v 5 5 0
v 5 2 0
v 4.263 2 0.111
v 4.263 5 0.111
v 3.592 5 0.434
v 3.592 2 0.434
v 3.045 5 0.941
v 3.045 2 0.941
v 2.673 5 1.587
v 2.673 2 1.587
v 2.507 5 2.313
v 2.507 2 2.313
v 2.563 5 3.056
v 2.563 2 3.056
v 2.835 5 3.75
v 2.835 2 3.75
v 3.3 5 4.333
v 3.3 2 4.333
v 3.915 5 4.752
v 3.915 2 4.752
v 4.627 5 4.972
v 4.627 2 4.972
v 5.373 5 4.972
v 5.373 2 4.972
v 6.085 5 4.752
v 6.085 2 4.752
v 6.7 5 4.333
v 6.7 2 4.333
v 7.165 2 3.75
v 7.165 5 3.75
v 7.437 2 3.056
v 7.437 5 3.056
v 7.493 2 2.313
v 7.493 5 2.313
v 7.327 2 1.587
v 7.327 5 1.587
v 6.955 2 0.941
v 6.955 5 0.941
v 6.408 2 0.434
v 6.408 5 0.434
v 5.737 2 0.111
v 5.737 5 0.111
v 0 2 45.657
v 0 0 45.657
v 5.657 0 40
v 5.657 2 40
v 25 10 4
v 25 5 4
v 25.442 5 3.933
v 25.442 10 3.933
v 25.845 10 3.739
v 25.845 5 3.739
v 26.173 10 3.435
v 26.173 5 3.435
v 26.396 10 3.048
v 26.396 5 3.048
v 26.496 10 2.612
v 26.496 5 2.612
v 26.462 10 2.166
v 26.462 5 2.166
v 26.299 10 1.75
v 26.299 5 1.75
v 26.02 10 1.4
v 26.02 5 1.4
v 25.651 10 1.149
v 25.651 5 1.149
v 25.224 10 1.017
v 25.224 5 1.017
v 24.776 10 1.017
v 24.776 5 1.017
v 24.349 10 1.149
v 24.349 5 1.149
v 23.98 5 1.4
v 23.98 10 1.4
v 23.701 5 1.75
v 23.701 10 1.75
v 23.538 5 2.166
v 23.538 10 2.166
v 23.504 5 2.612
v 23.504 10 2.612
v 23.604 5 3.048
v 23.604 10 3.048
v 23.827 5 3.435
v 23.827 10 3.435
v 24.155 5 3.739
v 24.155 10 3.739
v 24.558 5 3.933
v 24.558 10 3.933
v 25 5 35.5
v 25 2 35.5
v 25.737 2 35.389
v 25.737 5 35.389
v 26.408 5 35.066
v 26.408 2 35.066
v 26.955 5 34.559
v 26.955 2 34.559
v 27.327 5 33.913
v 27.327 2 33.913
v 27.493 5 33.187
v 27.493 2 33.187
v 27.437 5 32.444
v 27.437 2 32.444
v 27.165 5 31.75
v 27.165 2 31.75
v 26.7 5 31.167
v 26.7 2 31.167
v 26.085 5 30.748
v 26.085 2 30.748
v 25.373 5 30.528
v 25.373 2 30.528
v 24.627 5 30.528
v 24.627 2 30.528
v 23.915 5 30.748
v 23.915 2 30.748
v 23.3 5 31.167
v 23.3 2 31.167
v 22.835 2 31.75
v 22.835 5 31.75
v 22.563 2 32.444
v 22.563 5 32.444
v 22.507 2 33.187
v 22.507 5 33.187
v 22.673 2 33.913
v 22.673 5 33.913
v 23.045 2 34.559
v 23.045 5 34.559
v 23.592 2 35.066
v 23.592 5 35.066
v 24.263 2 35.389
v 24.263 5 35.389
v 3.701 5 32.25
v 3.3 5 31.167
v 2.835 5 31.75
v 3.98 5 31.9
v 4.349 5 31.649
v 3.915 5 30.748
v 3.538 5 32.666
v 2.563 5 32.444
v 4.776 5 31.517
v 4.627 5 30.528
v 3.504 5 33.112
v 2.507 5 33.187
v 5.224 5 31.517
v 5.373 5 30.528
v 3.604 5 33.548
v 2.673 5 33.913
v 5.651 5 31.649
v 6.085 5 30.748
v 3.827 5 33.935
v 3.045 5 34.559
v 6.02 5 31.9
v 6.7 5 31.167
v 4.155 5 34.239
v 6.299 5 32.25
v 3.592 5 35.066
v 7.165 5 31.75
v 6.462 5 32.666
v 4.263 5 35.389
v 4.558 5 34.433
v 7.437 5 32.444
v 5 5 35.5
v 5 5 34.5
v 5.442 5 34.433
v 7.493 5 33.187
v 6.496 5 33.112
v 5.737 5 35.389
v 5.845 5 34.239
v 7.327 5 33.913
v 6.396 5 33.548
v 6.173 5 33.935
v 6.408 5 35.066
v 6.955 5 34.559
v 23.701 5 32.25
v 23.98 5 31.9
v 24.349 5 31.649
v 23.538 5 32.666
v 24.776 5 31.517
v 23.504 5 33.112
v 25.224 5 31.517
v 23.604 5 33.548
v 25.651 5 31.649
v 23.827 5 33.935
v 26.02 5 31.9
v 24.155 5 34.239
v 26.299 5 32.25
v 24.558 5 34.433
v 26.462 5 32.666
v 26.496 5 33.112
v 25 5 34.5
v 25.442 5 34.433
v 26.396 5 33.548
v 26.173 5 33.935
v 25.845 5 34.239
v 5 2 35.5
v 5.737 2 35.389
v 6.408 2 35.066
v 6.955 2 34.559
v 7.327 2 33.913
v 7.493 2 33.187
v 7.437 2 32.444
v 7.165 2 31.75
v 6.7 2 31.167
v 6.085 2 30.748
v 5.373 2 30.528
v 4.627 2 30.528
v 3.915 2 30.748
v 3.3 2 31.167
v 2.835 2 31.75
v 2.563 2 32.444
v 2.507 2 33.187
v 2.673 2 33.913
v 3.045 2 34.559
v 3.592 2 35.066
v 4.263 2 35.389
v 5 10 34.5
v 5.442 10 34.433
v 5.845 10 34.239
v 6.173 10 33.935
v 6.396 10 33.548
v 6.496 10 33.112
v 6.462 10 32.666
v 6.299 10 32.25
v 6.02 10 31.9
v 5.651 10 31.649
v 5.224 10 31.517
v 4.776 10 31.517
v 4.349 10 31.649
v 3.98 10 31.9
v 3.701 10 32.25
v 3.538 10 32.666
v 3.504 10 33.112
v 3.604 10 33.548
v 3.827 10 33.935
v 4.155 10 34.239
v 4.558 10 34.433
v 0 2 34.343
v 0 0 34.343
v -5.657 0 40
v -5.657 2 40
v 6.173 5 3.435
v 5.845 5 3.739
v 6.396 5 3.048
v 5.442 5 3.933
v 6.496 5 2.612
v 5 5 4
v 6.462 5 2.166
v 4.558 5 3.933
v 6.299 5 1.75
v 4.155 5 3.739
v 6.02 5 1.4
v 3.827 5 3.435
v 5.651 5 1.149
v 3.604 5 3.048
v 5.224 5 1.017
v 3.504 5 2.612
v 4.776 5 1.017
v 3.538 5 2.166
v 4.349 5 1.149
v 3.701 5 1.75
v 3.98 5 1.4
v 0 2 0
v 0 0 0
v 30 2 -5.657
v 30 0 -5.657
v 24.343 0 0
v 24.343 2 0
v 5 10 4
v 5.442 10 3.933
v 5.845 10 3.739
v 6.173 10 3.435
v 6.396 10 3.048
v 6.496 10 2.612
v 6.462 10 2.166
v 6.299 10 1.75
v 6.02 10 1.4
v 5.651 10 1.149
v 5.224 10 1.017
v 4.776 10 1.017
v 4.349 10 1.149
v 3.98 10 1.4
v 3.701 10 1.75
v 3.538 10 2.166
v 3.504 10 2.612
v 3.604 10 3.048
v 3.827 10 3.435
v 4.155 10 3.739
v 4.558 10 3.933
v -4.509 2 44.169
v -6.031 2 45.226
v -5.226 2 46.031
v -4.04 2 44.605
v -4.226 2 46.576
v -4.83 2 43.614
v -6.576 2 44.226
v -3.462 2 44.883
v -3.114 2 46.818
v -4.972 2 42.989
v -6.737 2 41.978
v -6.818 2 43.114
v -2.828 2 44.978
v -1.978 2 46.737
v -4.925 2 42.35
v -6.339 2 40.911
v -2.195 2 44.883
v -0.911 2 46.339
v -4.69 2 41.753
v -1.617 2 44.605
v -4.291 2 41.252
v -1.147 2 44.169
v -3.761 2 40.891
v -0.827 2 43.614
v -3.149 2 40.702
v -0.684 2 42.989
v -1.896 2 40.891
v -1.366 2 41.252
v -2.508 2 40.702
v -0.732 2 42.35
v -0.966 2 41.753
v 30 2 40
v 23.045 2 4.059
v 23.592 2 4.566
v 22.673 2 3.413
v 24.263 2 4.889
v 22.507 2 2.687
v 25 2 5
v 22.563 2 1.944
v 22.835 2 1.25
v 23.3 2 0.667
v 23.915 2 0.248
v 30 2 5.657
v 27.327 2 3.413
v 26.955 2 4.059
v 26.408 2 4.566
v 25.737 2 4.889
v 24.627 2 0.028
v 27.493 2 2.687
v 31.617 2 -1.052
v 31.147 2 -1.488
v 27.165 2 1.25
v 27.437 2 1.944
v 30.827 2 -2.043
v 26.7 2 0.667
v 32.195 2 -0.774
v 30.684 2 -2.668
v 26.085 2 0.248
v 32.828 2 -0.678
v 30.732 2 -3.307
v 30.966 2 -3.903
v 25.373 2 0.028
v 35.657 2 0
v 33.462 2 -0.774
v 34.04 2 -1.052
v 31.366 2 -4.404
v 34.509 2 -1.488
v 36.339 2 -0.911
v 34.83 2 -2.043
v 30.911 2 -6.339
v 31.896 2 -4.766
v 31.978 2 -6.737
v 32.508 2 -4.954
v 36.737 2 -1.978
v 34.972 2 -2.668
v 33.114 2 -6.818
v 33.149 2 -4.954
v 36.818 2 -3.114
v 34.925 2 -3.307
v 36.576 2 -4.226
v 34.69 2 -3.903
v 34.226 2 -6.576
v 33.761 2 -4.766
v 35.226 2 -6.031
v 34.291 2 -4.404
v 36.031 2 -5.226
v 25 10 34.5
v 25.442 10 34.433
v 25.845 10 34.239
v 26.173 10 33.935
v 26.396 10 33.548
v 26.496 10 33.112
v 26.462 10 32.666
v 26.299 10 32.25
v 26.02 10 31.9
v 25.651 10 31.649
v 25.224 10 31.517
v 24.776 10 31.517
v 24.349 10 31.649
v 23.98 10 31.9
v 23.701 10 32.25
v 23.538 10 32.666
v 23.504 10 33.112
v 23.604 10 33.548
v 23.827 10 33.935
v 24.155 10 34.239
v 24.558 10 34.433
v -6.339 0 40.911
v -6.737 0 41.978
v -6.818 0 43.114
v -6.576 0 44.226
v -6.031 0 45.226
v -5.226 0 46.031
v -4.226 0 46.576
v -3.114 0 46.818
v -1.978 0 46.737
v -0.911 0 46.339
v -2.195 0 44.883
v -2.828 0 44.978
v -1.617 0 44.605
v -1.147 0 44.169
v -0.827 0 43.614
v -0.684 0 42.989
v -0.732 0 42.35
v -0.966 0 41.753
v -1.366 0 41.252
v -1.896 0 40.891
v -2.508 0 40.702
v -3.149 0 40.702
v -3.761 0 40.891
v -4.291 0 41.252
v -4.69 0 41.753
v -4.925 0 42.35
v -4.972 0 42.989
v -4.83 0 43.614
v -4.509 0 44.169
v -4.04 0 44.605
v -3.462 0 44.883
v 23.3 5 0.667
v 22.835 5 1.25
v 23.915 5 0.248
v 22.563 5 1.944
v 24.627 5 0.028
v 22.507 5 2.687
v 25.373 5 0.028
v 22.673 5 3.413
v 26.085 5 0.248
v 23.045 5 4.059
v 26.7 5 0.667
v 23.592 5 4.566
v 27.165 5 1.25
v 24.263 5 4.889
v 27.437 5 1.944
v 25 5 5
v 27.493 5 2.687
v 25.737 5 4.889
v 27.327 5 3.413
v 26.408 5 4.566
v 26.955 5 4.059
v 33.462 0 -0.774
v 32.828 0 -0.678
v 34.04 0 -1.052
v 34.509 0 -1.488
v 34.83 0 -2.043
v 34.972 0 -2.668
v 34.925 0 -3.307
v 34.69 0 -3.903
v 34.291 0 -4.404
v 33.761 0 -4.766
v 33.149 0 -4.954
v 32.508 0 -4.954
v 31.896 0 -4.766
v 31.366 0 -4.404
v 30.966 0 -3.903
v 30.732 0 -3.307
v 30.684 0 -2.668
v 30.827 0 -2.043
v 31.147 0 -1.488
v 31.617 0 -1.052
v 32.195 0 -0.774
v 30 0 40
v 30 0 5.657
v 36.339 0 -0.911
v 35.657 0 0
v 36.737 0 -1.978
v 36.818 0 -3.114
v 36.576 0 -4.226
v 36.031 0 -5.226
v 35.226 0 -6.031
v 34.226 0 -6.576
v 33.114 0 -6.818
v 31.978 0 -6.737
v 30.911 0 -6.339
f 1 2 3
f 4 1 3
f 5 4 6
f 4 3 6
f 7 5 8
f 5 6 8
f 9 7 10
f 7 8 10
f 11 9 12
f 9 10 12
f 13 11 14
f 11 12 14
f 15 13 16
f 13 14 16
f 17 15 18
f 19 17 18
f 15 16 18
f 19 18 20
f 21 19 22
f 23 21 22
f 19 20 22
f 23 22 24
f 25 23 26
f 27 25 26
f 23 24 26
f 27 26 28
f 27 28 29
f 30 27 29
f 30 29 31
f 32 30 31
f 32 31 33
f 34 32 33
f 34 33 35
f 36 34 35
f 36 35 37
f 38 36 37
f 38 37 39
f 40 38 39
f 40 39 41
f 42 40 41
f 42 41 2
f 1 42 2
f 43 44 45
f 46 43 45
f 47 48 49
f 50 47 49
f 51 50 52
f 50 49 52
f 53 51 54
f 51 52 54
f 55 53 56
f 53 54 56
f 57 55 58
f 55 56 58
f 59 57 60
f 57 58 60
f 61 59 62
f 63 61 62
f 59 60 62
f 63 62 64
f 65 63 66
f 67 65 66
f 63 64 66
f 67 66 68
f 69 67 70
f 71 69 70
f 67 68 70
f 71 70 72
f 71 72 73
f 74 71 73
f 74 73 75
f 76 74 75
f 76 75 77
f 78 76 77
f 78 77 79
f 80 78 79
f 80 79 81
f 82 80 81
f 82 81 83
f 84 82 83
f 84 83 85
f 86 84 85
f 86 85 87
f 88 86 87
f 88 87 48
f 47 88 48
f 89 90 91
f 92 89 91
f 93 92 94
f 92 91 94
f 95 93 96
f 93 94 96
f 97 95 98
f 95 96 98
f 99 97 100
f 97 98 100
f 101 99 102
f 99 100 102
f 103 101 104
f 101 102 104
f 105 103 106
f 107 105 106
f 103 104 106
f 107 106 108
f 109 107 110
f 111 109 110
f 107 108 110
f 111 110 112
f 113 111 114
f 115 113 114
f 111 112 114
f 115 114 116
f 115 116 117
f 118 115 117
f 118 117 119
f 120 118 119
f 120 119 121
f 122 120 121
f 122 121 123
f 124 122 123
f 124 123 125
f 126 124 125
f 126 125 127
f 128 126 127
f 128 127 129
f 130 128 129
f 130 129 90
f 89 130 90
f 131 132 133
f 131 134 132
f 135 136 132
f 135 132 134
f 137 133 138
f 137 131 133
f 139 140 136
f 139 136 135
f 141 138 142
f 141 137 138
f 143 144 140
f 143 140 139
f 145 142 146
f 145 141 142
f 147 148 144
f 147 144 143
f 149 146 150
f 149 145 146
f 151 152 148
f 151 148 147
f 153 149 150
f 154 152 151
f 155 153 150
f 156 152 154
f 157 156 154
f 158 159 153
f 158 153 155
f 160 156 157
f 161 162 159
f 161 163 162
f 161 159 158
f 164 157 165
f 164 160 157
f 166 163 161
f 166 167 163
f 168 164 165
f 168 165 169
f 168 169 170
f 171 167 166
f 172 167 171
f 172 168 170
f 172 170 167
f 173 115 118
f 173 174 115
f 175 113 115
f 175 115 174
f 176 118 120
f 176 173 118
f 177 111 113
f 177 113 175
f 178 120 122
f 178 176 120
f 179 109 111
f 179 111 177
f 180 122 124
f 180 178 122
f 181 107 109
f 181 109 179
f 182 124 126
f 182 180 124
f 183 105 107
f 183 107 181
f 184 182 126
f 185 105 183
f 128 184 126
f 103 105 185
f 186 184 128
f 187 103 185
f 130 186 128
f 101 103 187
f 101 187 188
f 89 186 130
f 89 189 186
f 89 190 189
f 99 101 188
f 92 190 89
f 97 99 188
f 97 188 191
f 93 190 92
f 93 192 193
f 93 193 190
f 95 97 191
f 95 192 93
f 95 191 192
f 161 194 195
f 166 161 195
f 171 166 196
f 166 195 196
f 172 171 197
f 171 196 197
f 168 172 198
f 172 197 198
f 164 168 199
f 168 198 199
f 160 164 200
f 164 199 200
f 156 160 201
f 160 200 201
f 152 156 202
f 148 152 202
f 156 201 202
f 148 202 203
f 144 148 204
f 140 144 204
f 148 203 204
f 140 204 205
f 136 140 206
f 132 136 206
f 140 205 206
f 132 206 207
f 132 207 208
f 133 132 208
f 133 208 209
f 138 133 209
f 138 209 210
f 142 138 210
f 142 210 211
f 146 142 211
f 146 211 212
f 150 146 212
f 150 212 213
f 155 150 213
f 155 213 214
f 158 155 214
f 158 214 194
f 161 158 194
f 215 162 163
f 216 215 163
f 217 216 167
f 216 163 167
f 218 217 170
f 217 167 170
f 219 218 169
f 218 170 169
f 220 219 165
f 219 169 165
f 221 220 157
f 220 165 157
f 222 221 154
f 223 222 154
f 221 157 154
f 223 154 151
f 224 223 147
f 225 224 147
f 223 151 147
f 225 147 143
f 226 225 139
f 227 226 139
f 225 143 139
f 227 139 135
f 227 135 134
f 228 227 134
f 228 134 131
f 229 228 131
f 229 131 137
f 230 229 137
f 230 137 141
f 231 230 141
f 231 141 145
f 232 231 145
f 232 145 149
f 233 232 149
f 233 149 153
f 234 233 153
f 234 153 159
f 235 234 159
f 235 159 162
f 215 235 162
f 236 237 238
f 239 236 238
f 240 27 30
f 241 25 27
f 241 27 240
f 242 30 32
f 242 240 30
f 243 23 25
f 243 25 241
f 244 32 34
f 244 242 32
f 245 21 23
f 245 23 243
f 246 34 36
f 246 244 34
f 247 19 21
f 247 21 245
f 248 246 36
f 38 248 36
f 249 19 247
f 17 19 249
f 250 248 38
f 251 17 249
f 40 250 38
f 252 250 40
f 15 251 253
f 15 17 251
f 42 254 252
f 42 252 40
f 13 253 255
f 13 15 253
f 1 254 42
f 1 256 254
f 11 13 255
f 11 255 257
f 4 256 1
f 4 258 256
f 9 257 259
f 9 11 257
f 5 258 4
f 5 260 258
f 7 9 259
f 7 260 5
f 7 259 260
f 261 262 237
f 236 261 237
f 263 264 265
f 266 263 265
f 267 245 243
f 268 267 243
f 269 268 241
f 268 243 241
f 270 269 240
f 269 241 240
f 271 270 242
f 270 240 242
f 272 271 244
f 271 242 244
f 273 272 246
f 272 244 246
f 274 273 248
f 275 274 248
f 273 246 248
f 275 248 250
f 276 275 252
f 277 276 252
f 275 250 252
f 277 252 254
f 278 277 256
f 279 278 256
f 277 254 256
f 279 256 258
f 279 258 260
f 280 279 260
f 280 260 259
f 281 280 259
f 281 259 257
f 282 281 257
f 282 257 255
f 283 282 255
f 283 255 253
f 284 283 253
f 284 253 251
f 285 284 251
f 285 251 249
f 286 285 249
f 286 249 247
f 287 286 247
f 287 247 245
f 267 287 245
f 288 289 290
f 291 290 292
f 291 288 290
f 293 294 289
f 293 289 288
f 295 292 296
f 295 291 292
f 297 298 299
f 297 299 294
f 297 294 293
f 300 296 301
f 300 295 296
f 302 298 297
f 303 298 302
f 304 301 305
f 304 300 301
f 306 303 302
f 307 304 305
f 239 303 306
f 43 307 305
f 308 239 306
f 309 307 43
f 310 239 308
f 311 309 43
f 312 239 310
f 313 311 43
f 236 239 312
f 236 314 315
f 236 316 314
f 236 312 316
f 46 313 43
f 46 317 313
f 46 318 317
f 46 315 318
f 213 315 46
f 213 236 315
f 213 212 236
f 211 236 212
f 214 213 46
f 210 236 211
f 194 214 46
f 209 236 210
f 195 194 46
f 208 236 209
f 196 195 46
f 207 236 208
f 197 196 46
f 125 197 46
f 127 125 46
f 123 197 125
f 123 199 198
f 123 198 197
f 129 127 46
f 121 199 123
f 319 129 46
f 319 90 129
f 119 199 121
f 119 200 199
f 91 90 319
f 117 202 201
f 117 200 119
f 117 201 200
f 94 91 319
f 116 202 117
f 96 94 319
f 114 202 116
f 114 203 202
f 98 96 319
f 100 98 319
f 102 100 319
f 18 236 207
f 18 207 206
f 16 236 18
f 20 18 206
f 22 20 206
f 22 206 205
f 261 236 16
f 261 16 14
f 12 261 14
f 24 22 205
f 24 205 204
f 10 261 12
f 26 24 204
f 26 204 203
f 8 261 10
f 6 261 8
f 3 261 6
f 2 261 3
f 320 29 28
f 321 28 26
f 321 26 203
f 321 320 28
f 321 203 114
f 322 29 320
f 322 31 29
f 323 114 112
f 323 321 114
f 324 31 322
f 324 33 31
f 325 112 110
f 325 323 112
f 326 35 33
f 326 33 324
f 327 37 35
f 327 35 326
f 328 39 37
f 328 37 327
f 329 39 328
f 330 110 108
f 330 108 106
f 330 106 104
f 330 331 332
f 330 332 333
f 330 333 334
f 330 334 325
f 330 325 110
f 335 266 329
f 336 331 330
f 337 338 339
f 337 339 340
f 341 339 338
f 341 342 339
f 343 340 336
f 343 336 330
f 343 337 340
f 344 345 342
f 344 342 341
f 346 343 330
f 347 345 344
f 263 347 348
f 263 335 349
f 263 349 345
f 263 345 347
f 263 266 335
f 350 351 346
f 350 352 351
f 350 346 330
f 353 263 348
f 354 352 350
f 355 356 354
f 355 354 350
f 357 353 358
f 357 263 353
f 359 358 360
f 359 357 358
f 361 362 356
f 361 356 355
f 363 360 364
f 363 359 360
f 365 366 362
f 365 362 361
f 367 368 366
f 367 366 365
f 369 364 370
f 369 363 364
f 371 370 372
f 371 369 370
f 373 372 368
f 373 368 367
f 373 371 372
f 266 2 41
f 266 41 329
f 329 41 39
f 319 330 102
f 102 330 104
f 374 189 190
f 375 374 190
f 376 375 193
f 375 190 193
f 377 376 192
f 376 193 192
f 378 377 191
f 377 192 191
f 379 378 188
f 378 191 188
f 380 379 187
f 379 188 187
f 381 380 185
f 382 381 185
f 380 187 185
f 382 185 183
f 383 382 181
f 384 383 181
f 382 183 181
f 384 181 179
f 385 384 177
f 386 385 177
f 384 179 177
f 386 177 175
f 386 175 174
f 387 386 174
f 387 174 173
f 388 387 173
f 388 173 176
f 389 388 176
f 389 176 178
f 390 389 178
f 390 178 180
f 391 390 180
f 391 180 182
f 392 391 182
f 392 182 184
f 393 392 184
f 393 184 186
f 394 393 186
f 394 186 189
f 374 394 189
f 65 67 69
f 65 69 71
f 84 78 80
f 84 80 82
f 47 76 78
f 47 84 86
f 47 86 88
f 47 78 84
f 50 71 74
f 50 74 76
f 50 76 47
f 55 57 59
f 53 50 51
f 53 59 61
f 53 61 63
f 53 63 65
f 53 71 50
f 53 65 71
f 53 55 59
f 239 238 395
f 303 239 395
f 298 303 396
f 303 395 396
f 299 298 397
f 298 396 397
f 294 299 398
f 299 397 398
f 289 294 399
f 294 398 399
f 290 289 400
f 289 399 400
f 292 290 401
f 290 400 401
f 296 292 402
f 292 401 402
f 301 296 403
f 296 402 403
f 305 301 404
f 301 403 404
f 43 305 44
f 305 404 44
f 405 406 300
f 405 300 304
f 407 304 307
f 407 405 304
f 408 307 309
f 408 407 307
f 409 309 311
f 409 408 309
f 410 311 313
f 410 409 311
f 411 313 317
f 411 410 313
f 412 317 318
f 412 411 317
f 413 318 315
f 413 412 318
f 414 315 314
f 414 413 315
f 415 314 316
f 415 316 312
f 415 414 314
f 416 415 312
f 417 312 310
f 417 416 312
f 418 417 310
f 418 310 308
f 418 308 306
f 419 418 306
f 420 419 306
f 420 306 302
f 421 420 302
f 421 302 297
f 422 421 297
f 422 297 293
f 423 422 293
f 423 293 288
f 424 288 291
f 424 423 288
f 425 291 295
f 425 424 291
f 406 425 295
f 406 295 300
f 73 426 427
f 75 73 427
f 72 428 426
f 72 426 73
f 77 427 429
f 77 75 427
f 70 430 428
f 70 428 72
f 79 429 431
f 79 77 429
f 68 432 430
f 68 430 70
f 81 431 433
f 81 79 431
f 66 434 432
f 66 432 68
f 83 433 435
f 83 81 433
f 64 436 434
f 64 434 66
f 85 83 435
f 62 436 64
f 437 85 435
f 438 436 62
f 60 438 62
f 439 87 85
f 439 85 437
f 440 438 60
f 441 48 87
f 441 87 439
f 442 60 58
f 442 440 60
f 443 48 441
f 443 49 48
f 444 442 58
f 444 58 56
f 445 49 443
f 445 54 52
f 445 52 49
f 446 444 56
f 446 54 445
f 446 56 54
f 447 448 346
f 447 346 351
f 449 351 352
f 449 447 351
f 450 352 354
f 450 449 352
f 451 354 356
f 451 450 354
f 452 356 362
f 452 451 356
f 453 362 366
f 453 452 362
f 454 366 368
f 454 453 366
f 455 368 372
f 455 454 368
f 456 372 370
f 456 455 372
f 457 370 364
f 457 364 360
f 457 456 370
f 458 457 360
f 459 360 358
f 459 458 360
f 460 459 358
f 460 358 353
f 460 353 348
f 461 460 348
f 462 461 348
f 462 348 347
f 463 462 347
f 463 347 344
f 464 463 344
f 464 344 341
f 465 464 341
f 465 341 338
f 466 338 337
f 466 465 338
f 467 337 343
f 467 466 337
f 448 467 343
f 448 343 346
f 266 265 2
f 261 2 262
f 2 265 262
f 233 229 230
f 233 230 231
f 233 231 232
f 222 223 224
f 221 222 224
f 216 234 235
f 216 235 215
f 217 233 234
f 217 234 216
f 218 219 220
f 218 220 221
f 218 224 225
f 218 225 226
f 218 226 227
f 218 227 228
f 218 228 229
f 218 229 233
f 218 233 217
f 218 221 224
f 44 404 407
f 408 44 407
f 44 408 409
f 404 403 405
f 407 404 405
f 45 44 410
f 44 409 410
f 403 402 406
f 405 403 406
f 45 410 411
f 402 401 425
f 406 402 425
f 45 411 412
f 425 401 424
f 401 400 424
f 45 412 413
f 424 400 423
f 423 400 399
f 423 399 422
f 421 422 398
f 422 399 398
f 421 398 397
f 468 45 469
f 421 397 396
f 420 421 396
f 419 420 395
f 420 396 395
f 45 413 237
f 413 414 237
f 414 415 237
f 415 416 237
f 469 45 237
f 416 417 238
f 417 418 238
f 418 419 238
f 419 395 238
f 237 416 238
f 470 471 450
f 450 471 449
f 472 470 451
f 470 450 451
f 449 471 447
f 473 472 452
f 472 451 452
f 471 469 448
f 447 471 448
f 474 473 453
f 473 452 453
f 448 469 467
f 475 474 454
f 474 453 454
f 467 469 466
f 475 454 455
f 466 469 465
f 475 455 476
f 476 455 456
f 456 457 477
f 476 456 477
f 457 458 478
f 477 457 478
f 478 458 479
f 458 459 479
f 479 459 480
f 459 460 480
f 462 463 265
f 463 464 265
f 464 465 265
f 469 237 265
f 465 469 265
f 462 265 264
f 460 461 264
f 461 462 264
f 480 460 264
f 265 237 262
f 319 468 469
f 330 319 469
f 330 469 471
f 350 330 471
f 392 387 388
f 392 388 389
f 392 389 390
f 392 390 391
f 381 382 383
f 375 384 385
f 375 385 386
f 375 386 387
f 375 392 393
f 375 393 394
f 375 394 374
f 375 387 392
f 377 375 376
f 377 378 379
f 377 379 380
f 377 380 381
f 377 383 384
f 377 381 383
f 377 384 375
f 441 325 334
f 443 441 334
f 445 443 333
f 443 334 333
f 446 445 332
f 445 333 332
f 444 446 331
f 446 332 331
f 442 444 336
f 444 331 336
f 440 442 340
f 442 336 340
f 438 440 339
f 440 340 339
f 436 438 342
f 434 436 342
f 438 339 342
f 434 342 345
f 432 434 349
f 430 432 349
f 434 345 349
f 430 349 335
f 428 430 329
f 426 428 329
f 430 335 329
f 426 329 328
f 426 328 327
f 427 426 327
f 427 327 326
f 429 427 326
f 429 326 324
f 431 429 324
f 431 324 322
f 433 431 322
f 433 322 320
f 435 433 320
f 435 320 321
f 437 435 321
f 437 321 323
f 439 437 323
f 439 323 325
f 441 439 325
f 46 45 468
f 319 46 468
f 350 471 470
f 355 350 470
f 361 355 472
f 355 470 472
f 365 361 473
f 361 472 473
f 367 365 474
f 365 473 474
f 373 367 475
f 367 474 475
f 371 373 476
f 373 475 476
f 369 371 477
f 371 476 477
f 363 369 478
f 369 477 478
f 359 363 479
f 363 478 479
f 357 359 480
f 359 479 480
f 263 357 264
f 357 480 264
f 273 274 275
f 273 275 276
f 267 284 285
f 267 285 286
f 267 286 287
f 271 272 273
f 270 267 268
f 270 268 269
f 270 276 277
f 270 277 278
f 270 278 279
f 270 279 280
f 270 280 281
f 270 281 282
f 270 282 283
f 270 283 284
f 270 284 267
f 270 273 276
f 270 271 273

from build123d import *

# Parameters (mm, degrees)
SKETCH1_R           = 2.15
BOSS_EXTRUDE1_DEPTH = 2
SKETCH2_R           = 1.5
BOSS_EXTRUDE2_DEPTH = 10
SKETCH3_R           = 2.5
BOSS_EXTRUDE3_DEPTH = 5


with BuildPart() as part:
    # Sketch1 → Boss-Extrude1 (new body)
    with BuildSketch(Plane(origin=(0, 0, 0), x_dir=(1, 0, 0), z_dir=(0, 1, 0))):
        with BuildLine():
            Line((24.343145751, 0), (0, 0))
            Line((0, 0), (0, -34.343145751))
            Line((0, -34.343145751), (-5.656854249, -40))
            ThreePointArc((-5.656854249, -40), (-5.656854249, -45.656854249), (0, -45.656854249))
            Line((0, -45.656854249), (5.656854249, -40))
            Line((5.656854249, -40), (30, -40))
            Line((30, -40), (30, -5.656854249))
            Line((30, -5.656854249), (35.656854249, 0))
            ThreePointArc((35.656854249, 0), (35.656854249, 5.656854249), (30, 5.656854249))
            Line((30, 5.656854249), (24.343145751, 0))
        make_face()
        with Locations(Location((32.828427125, 2.828427125, 0), (0, 0, 270))):
            Circle(SKETCH1_R, mode=Mode.SUBTRACT)
        with Locations(Location((-2.828427125, -42.828427125, 0), (0, 0, 270))):
            Circle(SKETCH1_R, mode=Mode.SUBTRACT)
    extrude(amount=BOSS_EXTRUDE1_DEPTH)

    # Sketch2 → Boss-Extrude2 (add)
    with BuildSketch(Plane(origin=(0, 0, 0), x_dir=(1, 0, 0), z_dir=(0, 1, 0))):
        with Locations(Location((25, -2.5, 0), (0, 0, 270))):
            Circle(SKETCH2_R)
        with Locations(Location((25, -33, 0), (0, 0, 270))):
            Circle(SKETCH2_R)
        with Locations(Location((5, -33, 0), (0, 0, 270))):
            Circle(SKETCH2_R)
        with Locations(Location((5, -2.5, 0), (0, 0, 270))):
            Circle(SKETCH2_R)
    extrude(amount=BOSS_EXTRUDE2_DEPTH)

    # Sketch3 → Boss-Extrude3 (add)
    with BuildSketch(Plane(origin=(0, 0, 0), x_dir=(1, 0, 0), z_dir=(0, 1, 0))):
        with Locations(Location((5, -2.5, 0), (0, 0, 90))):
            Circle(SKETCH3_R)
        with Locations(Location((25, -2.5, 0), (0, 0, 270))):
            Circle(SKETCH3_R)
        with Locations(Location((25, -33, 0), (0, 0, 270))):
            Circle(SKETCH3_R)
        with Locations(Location((5, -33, 0), (0, 0, 270))):
            Circle(SKETCH3_R)
    extrude(amount=BOSS_EXTRUDE3_DEPTH)


solid = part.part
